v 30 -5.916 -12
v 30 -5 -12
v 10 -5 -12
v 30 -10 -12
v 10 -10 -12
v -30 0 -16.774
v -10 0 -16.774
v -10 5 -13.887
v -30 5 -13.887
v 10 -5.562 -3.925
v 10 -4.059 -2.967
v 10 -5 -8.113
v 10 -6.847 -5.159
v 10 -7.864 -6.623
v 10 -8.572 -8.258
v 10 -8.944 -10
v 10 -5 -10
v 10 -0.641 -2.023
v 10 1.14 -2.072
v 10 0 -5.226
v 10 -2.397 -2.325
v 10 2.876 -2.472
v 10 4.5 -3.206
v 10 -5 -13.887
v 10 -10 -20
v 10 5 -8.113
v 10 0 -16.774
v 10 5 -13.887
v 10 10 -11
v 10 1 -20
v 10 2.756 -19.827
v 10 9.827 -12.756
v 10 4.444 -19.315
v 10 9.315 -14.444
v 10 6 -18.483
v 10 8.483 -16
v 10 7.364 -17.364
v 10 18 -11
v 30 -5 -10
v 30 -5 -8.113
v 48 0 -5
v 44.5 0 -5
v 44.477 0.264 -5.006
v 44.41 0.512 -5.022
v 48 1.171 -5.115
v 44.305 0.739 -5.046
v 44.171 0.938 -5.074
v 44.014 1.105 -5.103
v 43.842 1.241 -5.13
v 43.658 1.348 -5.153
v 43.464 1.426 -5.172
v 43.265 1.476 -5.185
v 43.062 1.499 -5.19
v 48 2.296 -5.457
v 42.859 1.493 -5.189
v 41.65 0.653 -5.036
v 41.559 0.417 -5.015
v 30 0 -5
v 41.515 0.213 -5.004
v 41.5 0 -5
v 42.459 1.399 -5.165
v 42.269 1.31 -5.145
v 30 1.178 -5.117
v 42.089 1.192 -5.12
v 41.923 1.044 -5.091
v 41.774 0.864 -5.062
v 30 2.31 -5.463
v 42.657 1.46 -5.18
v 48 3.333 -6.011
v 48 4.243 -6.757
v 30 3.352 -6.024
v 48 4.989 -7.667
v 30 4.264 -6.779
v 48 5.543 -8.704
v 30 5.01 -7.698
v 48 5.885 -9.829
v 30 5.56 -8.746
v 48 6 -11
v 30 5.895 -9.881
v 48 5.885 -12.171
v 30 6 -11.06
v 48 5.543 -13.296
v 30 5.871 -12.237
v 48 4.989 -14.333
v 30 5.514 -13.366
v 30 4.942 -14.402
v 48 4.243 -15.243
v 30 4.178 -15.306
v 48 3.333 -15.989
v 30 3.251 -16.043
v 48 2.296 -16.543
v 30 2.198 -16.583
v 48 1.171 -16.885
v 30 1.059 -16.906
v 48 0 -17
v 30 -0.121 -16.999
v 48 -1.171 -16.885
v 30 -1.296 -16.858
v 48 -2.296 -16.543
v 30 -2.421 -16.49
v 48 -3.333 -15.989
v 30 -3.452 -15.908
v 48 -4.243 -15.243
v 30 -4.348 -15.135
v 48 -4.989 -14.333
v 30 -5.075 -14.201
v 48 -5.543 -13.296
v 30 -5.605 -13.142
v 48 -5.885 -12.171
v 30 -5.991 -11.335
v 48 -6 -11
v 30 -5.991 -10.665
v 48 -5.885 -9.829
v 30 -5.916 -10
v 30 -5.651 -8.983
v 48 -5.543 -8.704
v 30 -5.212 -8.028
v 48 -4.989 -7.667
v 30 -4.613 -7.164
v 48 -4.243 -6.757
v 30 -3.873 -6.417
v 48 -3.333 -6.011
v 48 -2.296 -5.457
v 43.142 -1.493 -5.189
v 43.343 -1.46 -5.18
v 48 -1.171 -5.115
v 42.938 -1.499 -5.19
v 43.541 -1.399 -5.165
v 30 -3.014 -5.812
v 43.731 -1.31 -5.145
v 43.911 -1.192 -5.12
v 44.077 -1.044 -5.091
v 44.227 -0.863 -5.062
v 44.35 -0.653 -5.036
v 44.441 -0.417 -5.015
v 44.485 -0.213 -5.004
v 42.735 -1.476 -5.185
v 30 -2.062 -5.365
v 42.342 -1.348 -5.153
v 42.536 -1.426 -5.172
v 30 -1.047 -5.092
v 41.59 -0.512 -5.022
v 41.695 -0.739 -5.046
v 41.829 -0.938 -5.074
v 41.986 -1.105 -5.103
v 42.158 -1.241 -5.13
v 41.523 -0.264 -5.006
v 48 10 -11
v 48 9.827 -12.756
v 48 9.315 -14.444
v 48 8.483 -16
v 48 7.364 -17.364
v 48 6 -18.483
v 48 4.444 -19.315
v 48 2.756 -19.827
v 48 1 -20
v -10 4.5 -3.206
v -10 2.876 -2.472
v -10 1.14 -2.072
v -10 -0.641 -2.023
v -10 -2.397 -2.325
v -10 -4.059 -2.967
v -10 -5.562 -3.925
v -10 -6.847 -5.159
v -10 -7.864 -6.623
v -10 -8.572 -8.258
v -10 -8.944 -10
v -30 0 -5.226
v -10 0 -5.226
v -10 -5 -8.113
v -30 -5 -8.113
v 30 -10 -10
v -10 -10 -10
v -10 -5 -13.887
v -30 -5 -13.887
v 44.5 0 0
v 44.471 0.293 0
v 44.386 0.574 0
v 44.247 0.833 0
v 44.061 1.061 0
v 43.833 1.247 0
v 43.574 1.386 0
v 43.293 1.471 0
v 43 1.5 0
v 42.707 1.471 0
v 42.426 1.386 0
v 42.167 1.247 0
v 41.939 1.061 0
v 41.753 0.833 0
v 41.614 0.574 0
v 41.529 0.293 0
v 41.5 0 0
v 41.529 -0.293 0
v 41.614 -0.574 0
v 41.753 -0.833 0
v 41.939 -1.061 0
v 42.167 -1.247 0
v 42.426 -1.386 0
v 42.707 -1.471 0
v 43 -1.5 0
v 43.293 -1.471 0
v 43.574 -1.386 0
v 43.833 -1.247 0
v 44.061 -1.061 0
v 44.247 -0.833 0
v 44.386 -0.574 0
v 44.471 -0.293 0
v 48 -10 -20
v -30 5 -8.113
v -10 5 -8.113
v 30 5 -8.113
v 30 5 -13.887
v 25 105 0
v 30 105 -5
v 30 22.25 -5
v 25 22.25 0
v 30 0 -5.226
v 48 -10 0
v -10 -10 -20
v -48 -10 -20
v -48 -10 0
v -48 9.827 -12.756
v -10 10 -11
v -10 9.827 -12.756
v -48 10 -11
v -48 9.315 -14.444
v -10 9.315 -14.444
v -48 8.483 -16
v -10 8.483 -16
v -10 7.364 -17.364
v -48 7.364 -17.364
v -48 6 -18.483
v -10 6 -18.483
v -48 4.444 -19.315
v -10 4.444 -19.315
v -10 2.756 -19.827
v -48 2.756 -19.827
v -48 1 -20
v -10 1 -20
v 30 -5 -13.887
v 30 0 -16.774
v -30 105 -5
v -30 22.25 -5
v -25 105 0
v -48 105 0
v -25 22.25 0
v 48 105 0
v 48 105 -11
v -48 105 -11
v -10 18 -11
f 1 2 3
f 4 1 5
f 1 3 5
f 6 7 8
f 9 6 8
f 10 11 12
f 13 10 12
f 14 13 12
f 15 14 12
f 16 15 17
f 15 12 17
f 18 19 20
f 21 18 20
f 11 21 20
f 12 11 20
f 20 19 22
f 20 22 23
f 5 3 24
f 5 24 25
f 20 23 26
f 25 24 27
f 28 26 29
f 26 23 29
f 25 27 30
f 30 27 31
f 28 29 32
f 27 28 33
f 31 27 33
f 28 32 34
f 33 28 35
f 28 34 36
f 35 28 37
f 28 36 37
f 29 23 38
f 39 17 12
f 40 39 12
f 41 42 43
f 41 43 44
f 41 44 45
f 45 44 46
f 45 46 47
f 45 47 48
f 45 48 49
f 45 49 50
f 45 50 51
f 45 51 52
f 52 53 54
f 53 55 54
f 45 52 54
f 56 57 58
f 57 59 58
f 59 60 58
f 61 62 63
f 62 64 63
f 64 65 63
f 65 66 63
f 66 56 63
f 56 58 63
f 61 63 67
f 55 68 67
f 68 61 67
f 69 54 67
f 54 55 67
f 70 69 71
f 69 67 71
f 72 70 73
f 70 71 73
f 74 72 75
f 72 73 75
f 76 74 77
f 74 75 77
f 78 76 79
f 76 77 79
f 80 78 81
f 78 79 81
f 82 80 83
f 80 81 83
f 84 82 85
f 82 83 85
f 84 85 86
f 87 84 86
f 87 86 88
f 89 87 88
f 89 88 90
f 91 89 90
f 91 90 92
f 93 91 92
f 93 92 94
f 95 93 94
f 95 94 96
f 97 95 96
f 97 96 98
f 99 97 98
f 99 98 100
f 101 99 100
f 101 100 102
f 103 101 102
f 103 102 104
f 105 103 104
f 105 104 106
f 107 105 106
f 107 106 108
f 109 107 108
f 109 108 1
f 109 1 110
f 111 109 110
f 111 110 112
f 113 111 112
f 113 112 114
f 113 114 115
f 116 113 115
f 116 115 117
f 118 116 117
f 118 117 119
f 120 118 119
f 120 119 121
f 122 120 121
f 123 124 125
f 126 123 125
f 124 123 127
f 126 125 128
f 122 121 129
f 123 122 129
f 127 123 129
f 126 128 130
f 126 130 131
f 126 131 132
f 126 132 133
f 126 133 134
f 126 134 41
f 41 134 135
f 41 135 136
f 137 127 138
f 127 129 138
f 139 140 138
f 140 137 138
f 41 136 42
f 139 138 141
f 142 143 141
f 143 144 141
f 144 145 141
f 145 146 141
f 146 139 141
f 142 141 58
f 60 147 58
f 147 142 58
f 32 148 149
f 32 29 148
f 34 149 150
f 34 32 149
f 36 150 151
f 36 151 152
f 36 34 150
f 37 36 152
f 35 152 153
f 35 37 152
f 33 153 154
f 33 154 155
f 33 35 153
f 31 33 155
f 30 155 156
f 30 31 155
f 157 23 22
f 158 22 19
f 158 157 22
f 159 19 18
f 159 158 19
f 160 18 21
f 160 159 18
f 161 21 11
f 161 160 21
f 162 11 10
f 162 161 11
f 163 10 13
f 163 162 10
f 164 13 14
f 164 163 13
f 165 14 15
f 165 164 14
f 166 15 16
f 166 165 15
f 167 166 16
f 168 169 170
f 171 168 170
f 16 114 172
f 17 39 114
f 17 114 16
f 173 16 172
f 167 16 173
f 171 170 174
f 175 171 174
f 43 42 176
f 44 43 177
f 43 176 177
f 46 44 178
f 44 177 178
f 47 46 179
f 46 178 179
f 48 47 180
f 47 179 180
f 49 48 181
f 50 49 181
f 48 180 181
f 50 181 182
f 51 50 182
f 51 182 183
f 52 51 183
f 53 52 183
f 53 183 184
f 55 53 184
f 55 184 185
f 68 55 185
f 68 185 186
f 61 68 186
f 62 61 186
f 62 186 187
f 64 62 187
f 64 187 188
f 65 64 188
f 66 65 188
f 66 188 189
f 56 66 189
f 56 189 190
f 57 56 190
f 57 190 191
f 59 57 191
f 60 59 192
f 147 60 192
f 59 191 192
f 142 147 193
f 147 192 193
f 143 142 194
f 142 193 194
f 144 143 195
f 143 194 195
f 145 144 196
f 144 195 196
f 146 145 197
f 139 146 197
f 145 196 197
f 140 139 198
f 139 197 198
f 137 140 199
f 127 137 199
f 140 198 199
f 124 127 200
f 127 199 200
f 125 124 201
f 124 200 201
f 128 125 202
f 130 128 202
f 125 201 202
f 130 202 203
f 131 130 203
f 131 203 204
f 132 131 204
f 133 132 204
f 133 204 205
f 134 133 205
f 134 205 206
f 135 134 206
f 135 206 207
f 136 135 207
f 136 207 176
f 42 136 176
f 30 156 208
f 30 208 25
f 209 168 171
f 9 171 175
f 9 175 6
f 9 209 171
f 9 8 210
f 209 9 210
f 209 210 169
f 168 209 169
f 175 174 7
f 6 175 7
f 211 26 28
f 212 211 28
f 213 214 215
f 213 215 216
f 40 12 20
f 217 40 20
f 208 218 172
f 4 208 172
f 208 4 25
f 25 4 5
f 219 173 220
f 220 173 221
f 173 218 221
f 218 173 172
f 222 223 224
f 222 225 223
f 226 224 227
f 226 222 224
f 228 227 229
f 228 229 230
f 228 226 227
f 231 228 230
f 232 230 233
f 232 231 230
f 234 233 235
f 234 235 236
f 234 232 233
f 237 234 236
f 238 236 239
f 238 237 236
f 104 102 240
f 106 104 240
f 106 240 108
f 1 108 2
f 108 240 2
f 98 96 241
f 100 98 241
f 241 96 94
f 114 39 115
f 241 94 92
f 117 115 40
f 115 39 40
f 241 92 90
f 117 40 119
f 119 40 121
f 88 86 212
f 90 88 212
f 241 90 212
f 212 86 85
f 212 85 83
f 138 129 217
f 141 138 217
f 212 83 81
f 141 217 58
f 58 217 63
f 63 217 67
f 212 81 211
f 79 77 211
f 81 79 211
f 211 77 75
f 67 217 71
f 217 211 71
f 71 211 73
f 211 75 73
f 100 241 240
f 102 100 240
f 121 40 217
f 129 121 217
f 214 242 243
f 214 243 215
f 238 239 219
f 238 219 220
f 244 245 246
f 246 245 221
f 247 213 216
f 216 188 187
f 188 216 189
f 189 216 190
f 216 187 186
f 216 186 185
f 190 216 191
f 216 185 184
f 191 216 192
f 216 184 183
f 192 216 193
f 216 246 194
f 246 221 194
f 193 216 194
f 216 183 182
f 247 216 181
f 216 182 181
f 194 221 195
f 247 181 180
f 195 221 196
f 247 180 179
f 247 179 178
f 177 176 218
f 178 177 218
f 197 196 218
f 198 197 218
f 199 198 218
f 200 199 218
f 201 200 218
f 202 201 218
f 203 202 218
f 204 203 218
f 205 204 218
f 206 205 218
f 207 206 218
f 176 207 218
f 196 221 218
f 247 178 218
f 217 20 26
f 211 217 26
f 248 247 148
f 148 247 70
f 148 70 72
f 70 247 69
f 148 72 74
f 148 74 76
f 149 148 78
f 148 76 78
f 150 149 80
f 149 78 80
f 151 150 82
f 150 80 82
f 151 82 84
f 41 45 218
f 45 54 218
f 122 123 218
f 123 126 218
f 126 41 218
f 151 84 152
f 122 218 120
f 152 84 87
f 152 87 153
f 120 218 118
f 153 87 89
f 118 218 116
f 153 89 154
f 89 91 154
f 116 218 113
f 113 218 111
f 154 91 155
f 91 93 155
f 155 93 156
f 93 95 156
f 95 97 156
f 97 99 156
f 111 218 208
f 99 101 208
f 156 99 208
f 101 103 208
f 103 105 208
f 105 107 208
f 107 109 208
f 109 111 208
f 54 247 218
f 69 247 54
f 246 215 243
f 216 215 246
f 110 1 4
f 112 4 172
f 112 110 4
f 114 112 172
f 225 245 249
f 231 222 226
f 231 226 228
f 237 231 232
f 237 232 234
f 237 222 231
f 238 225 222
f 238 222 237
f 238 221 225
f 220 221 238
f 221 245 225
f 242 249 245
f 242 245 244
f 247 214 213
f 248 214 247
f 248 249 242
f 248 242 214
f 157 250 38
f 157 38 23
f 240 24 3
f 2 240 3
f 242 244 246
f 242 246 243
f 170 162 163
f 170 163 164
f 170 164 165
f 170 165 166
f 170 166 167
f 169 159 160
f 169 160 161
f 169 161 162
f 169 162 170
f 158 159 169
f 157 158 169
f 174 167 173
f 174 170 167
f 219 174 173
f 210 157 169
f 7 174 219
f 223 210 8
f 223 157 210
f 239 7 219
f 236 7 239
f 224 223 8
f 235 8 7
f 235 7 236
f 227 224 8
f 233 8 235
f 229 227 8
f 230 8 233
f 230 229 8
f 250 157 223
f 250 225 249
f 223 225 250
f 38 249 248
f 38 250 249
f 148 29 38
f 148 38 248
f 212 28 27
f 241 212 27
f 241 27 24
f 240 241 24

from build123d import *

# Parameters (mm, degrees)
BOSS_EXTRUDE1_DEPTH = 10
BOSS_EXTRUDE3_DEPTH = 10
CUT_EXTRUDE1_DEPTH  = 20
CUT_EXTRUDE2_DEPTH  = 20
SKETCH5_R           = 6
CUT_EXTRUDE3_DEPTH  = 18
SKETCH11_W          = 96
SKETCH11_H          = 11
BOSS_EXTRUDE2_DEPTH = 95
CUT_EXTRUDE10_DEPTH = 20
CUT_EXTRUDE11_DEPTH = 82.75
FILLET3_R           = 9
SKETCH18_R          = 1.5
CUT_EXTRUDE12_DEPTH = 10


with BuildPart() as part:
    # Sketch2 → Boss-Extrude1 (new body)
    with BuildSketch(Plane(origin=(0, 0, 0), x_dir=(1, 0, 0), z_dir=(0, 1, 0))):
        Polygon((-48, 0), (48, 0), (48, 20), (10, 20), (10, 11), (-10, 11), (-10, 20), (-48, 20), align=None)
    extrude(amount=BOSS_EXTRUDE1_DEPTH)

    # Sketch16 → Boss-Extrude3 (add)
    with BuildSketch(Plane.XZ):
        Polygon((-48, 0), (48, 0), (48, -20), (10, -20), (10, -10), (-10, -10), (-10, -20), (-48, -20), align=None)
    extrude(amount=BOSS_EXTRUDE3_DEPTH)

    # Sketch3 → Cut-Extrude1 (cut)
    with BuildSketch(Plane(origin=(-10, 0, 0), x_dir=(0, 0, -1), z_dir=(1, 0, 0))):
        Polygon((16.773502692, 0), (13.886751346, 5), (8.113248654, 5), (5.226497308, 0), (8.113248654, -5), (13.886751346, -5), align=None)
    extrude(amount=-CUT_EXTRUDE1_DEPTH, mode=Mode.SUBTRACT)

    # Sketch4 → Cut-Extrude2 (cut)
    with BuildSketch(Plane.ZY.offset(-10)):
        Polygon((-16.773502692, 0), (-13.886751346, -5), (-12, -5), (-12, -10), (-10, -10), (-10, -5), (-8.113248654, -5), (-5.226497308, 0), (-8.113248654, 5), (-13.886751346, 5), align=None)
    extrude(amount=-CUT_EXTRUDE2_DEPTH, mode=Mode.SUBTRACT)

    # Sketch5 → Cut-Extrude3 (cut)
    with BuildSketch(Plane.ZY.offset(-30)):
        with Locations((-11, 0)):
            Circle(SKETCH5_R)
    extrude(amount=-CUT_EXTRUDE3_DEPTH, mode=Mode.SUBTRACT)

    # Sketch11 → Boss-Extrude2 (add)
    with BuildSketch(Plane(origin=(0, 10, 0), x_dir=(1, 0, 0), z_dir=(0, 1, 0))):
        with Locations((0, 5.5)):
            Rectangle(SKETCH11_W, SKETCH11_H)
    extrude(amount=BOSS_EXTRUDE2_DEPTH)

    # Sketch14 → Cut-Extrude10 (cut)
    with BuildSketch(Plane(origin=(-10, 0, 0), x_dir=(0, 0, -1), z_dir=(1, 0, 0))):
        with BuildLine():
            Line((11, -9), (11, 18))
            Line((11, 18), (3.205771366, 4.5))
            ThreePointArc((3.205771366, 4.5), (3.205771366, -4.5), (11, -9))
        make_face()
    extrude(amount=CUT_EXTRUDE10_DEPTH, mode=Mode.SUBTRACT)

    # Sketch17 → Cut-Extrude11 (cut)
    with BuildSketch(Plane(origin=(0, 105, 0), x_dir=(1, 0, 0), z_dir=(0, 1, 0))):
        Polygon((25, 0), (-25, 0), (-30, 5), (30, 5), align=None)
    extrude(amount=-CUT_EXTRUDE11_DEPTH, mode=Mode.SUBTRACT)

    # Fillet3
    fillet3_edges = [part.edges().sort_by_distance(p)[0] for p in [
        (29, 10, -20),
        (-29, 10, -20),
    ]]
    fillet(fillet3_edges, radius=FILLET3_R - 0.0001)  # a hair under: the kernel refuses the full size

    # Sketch18 → Cut-Extrude12 (cut)
    with BuildSketch(Plane.XY):
        with Locations((43, 0)):
            Circle(SKETCH18_R)
    extrude(amount=-CUT_EXTRUDE12_DEPTH, mode=Mode.SUBTRACT)


solid = part.part
